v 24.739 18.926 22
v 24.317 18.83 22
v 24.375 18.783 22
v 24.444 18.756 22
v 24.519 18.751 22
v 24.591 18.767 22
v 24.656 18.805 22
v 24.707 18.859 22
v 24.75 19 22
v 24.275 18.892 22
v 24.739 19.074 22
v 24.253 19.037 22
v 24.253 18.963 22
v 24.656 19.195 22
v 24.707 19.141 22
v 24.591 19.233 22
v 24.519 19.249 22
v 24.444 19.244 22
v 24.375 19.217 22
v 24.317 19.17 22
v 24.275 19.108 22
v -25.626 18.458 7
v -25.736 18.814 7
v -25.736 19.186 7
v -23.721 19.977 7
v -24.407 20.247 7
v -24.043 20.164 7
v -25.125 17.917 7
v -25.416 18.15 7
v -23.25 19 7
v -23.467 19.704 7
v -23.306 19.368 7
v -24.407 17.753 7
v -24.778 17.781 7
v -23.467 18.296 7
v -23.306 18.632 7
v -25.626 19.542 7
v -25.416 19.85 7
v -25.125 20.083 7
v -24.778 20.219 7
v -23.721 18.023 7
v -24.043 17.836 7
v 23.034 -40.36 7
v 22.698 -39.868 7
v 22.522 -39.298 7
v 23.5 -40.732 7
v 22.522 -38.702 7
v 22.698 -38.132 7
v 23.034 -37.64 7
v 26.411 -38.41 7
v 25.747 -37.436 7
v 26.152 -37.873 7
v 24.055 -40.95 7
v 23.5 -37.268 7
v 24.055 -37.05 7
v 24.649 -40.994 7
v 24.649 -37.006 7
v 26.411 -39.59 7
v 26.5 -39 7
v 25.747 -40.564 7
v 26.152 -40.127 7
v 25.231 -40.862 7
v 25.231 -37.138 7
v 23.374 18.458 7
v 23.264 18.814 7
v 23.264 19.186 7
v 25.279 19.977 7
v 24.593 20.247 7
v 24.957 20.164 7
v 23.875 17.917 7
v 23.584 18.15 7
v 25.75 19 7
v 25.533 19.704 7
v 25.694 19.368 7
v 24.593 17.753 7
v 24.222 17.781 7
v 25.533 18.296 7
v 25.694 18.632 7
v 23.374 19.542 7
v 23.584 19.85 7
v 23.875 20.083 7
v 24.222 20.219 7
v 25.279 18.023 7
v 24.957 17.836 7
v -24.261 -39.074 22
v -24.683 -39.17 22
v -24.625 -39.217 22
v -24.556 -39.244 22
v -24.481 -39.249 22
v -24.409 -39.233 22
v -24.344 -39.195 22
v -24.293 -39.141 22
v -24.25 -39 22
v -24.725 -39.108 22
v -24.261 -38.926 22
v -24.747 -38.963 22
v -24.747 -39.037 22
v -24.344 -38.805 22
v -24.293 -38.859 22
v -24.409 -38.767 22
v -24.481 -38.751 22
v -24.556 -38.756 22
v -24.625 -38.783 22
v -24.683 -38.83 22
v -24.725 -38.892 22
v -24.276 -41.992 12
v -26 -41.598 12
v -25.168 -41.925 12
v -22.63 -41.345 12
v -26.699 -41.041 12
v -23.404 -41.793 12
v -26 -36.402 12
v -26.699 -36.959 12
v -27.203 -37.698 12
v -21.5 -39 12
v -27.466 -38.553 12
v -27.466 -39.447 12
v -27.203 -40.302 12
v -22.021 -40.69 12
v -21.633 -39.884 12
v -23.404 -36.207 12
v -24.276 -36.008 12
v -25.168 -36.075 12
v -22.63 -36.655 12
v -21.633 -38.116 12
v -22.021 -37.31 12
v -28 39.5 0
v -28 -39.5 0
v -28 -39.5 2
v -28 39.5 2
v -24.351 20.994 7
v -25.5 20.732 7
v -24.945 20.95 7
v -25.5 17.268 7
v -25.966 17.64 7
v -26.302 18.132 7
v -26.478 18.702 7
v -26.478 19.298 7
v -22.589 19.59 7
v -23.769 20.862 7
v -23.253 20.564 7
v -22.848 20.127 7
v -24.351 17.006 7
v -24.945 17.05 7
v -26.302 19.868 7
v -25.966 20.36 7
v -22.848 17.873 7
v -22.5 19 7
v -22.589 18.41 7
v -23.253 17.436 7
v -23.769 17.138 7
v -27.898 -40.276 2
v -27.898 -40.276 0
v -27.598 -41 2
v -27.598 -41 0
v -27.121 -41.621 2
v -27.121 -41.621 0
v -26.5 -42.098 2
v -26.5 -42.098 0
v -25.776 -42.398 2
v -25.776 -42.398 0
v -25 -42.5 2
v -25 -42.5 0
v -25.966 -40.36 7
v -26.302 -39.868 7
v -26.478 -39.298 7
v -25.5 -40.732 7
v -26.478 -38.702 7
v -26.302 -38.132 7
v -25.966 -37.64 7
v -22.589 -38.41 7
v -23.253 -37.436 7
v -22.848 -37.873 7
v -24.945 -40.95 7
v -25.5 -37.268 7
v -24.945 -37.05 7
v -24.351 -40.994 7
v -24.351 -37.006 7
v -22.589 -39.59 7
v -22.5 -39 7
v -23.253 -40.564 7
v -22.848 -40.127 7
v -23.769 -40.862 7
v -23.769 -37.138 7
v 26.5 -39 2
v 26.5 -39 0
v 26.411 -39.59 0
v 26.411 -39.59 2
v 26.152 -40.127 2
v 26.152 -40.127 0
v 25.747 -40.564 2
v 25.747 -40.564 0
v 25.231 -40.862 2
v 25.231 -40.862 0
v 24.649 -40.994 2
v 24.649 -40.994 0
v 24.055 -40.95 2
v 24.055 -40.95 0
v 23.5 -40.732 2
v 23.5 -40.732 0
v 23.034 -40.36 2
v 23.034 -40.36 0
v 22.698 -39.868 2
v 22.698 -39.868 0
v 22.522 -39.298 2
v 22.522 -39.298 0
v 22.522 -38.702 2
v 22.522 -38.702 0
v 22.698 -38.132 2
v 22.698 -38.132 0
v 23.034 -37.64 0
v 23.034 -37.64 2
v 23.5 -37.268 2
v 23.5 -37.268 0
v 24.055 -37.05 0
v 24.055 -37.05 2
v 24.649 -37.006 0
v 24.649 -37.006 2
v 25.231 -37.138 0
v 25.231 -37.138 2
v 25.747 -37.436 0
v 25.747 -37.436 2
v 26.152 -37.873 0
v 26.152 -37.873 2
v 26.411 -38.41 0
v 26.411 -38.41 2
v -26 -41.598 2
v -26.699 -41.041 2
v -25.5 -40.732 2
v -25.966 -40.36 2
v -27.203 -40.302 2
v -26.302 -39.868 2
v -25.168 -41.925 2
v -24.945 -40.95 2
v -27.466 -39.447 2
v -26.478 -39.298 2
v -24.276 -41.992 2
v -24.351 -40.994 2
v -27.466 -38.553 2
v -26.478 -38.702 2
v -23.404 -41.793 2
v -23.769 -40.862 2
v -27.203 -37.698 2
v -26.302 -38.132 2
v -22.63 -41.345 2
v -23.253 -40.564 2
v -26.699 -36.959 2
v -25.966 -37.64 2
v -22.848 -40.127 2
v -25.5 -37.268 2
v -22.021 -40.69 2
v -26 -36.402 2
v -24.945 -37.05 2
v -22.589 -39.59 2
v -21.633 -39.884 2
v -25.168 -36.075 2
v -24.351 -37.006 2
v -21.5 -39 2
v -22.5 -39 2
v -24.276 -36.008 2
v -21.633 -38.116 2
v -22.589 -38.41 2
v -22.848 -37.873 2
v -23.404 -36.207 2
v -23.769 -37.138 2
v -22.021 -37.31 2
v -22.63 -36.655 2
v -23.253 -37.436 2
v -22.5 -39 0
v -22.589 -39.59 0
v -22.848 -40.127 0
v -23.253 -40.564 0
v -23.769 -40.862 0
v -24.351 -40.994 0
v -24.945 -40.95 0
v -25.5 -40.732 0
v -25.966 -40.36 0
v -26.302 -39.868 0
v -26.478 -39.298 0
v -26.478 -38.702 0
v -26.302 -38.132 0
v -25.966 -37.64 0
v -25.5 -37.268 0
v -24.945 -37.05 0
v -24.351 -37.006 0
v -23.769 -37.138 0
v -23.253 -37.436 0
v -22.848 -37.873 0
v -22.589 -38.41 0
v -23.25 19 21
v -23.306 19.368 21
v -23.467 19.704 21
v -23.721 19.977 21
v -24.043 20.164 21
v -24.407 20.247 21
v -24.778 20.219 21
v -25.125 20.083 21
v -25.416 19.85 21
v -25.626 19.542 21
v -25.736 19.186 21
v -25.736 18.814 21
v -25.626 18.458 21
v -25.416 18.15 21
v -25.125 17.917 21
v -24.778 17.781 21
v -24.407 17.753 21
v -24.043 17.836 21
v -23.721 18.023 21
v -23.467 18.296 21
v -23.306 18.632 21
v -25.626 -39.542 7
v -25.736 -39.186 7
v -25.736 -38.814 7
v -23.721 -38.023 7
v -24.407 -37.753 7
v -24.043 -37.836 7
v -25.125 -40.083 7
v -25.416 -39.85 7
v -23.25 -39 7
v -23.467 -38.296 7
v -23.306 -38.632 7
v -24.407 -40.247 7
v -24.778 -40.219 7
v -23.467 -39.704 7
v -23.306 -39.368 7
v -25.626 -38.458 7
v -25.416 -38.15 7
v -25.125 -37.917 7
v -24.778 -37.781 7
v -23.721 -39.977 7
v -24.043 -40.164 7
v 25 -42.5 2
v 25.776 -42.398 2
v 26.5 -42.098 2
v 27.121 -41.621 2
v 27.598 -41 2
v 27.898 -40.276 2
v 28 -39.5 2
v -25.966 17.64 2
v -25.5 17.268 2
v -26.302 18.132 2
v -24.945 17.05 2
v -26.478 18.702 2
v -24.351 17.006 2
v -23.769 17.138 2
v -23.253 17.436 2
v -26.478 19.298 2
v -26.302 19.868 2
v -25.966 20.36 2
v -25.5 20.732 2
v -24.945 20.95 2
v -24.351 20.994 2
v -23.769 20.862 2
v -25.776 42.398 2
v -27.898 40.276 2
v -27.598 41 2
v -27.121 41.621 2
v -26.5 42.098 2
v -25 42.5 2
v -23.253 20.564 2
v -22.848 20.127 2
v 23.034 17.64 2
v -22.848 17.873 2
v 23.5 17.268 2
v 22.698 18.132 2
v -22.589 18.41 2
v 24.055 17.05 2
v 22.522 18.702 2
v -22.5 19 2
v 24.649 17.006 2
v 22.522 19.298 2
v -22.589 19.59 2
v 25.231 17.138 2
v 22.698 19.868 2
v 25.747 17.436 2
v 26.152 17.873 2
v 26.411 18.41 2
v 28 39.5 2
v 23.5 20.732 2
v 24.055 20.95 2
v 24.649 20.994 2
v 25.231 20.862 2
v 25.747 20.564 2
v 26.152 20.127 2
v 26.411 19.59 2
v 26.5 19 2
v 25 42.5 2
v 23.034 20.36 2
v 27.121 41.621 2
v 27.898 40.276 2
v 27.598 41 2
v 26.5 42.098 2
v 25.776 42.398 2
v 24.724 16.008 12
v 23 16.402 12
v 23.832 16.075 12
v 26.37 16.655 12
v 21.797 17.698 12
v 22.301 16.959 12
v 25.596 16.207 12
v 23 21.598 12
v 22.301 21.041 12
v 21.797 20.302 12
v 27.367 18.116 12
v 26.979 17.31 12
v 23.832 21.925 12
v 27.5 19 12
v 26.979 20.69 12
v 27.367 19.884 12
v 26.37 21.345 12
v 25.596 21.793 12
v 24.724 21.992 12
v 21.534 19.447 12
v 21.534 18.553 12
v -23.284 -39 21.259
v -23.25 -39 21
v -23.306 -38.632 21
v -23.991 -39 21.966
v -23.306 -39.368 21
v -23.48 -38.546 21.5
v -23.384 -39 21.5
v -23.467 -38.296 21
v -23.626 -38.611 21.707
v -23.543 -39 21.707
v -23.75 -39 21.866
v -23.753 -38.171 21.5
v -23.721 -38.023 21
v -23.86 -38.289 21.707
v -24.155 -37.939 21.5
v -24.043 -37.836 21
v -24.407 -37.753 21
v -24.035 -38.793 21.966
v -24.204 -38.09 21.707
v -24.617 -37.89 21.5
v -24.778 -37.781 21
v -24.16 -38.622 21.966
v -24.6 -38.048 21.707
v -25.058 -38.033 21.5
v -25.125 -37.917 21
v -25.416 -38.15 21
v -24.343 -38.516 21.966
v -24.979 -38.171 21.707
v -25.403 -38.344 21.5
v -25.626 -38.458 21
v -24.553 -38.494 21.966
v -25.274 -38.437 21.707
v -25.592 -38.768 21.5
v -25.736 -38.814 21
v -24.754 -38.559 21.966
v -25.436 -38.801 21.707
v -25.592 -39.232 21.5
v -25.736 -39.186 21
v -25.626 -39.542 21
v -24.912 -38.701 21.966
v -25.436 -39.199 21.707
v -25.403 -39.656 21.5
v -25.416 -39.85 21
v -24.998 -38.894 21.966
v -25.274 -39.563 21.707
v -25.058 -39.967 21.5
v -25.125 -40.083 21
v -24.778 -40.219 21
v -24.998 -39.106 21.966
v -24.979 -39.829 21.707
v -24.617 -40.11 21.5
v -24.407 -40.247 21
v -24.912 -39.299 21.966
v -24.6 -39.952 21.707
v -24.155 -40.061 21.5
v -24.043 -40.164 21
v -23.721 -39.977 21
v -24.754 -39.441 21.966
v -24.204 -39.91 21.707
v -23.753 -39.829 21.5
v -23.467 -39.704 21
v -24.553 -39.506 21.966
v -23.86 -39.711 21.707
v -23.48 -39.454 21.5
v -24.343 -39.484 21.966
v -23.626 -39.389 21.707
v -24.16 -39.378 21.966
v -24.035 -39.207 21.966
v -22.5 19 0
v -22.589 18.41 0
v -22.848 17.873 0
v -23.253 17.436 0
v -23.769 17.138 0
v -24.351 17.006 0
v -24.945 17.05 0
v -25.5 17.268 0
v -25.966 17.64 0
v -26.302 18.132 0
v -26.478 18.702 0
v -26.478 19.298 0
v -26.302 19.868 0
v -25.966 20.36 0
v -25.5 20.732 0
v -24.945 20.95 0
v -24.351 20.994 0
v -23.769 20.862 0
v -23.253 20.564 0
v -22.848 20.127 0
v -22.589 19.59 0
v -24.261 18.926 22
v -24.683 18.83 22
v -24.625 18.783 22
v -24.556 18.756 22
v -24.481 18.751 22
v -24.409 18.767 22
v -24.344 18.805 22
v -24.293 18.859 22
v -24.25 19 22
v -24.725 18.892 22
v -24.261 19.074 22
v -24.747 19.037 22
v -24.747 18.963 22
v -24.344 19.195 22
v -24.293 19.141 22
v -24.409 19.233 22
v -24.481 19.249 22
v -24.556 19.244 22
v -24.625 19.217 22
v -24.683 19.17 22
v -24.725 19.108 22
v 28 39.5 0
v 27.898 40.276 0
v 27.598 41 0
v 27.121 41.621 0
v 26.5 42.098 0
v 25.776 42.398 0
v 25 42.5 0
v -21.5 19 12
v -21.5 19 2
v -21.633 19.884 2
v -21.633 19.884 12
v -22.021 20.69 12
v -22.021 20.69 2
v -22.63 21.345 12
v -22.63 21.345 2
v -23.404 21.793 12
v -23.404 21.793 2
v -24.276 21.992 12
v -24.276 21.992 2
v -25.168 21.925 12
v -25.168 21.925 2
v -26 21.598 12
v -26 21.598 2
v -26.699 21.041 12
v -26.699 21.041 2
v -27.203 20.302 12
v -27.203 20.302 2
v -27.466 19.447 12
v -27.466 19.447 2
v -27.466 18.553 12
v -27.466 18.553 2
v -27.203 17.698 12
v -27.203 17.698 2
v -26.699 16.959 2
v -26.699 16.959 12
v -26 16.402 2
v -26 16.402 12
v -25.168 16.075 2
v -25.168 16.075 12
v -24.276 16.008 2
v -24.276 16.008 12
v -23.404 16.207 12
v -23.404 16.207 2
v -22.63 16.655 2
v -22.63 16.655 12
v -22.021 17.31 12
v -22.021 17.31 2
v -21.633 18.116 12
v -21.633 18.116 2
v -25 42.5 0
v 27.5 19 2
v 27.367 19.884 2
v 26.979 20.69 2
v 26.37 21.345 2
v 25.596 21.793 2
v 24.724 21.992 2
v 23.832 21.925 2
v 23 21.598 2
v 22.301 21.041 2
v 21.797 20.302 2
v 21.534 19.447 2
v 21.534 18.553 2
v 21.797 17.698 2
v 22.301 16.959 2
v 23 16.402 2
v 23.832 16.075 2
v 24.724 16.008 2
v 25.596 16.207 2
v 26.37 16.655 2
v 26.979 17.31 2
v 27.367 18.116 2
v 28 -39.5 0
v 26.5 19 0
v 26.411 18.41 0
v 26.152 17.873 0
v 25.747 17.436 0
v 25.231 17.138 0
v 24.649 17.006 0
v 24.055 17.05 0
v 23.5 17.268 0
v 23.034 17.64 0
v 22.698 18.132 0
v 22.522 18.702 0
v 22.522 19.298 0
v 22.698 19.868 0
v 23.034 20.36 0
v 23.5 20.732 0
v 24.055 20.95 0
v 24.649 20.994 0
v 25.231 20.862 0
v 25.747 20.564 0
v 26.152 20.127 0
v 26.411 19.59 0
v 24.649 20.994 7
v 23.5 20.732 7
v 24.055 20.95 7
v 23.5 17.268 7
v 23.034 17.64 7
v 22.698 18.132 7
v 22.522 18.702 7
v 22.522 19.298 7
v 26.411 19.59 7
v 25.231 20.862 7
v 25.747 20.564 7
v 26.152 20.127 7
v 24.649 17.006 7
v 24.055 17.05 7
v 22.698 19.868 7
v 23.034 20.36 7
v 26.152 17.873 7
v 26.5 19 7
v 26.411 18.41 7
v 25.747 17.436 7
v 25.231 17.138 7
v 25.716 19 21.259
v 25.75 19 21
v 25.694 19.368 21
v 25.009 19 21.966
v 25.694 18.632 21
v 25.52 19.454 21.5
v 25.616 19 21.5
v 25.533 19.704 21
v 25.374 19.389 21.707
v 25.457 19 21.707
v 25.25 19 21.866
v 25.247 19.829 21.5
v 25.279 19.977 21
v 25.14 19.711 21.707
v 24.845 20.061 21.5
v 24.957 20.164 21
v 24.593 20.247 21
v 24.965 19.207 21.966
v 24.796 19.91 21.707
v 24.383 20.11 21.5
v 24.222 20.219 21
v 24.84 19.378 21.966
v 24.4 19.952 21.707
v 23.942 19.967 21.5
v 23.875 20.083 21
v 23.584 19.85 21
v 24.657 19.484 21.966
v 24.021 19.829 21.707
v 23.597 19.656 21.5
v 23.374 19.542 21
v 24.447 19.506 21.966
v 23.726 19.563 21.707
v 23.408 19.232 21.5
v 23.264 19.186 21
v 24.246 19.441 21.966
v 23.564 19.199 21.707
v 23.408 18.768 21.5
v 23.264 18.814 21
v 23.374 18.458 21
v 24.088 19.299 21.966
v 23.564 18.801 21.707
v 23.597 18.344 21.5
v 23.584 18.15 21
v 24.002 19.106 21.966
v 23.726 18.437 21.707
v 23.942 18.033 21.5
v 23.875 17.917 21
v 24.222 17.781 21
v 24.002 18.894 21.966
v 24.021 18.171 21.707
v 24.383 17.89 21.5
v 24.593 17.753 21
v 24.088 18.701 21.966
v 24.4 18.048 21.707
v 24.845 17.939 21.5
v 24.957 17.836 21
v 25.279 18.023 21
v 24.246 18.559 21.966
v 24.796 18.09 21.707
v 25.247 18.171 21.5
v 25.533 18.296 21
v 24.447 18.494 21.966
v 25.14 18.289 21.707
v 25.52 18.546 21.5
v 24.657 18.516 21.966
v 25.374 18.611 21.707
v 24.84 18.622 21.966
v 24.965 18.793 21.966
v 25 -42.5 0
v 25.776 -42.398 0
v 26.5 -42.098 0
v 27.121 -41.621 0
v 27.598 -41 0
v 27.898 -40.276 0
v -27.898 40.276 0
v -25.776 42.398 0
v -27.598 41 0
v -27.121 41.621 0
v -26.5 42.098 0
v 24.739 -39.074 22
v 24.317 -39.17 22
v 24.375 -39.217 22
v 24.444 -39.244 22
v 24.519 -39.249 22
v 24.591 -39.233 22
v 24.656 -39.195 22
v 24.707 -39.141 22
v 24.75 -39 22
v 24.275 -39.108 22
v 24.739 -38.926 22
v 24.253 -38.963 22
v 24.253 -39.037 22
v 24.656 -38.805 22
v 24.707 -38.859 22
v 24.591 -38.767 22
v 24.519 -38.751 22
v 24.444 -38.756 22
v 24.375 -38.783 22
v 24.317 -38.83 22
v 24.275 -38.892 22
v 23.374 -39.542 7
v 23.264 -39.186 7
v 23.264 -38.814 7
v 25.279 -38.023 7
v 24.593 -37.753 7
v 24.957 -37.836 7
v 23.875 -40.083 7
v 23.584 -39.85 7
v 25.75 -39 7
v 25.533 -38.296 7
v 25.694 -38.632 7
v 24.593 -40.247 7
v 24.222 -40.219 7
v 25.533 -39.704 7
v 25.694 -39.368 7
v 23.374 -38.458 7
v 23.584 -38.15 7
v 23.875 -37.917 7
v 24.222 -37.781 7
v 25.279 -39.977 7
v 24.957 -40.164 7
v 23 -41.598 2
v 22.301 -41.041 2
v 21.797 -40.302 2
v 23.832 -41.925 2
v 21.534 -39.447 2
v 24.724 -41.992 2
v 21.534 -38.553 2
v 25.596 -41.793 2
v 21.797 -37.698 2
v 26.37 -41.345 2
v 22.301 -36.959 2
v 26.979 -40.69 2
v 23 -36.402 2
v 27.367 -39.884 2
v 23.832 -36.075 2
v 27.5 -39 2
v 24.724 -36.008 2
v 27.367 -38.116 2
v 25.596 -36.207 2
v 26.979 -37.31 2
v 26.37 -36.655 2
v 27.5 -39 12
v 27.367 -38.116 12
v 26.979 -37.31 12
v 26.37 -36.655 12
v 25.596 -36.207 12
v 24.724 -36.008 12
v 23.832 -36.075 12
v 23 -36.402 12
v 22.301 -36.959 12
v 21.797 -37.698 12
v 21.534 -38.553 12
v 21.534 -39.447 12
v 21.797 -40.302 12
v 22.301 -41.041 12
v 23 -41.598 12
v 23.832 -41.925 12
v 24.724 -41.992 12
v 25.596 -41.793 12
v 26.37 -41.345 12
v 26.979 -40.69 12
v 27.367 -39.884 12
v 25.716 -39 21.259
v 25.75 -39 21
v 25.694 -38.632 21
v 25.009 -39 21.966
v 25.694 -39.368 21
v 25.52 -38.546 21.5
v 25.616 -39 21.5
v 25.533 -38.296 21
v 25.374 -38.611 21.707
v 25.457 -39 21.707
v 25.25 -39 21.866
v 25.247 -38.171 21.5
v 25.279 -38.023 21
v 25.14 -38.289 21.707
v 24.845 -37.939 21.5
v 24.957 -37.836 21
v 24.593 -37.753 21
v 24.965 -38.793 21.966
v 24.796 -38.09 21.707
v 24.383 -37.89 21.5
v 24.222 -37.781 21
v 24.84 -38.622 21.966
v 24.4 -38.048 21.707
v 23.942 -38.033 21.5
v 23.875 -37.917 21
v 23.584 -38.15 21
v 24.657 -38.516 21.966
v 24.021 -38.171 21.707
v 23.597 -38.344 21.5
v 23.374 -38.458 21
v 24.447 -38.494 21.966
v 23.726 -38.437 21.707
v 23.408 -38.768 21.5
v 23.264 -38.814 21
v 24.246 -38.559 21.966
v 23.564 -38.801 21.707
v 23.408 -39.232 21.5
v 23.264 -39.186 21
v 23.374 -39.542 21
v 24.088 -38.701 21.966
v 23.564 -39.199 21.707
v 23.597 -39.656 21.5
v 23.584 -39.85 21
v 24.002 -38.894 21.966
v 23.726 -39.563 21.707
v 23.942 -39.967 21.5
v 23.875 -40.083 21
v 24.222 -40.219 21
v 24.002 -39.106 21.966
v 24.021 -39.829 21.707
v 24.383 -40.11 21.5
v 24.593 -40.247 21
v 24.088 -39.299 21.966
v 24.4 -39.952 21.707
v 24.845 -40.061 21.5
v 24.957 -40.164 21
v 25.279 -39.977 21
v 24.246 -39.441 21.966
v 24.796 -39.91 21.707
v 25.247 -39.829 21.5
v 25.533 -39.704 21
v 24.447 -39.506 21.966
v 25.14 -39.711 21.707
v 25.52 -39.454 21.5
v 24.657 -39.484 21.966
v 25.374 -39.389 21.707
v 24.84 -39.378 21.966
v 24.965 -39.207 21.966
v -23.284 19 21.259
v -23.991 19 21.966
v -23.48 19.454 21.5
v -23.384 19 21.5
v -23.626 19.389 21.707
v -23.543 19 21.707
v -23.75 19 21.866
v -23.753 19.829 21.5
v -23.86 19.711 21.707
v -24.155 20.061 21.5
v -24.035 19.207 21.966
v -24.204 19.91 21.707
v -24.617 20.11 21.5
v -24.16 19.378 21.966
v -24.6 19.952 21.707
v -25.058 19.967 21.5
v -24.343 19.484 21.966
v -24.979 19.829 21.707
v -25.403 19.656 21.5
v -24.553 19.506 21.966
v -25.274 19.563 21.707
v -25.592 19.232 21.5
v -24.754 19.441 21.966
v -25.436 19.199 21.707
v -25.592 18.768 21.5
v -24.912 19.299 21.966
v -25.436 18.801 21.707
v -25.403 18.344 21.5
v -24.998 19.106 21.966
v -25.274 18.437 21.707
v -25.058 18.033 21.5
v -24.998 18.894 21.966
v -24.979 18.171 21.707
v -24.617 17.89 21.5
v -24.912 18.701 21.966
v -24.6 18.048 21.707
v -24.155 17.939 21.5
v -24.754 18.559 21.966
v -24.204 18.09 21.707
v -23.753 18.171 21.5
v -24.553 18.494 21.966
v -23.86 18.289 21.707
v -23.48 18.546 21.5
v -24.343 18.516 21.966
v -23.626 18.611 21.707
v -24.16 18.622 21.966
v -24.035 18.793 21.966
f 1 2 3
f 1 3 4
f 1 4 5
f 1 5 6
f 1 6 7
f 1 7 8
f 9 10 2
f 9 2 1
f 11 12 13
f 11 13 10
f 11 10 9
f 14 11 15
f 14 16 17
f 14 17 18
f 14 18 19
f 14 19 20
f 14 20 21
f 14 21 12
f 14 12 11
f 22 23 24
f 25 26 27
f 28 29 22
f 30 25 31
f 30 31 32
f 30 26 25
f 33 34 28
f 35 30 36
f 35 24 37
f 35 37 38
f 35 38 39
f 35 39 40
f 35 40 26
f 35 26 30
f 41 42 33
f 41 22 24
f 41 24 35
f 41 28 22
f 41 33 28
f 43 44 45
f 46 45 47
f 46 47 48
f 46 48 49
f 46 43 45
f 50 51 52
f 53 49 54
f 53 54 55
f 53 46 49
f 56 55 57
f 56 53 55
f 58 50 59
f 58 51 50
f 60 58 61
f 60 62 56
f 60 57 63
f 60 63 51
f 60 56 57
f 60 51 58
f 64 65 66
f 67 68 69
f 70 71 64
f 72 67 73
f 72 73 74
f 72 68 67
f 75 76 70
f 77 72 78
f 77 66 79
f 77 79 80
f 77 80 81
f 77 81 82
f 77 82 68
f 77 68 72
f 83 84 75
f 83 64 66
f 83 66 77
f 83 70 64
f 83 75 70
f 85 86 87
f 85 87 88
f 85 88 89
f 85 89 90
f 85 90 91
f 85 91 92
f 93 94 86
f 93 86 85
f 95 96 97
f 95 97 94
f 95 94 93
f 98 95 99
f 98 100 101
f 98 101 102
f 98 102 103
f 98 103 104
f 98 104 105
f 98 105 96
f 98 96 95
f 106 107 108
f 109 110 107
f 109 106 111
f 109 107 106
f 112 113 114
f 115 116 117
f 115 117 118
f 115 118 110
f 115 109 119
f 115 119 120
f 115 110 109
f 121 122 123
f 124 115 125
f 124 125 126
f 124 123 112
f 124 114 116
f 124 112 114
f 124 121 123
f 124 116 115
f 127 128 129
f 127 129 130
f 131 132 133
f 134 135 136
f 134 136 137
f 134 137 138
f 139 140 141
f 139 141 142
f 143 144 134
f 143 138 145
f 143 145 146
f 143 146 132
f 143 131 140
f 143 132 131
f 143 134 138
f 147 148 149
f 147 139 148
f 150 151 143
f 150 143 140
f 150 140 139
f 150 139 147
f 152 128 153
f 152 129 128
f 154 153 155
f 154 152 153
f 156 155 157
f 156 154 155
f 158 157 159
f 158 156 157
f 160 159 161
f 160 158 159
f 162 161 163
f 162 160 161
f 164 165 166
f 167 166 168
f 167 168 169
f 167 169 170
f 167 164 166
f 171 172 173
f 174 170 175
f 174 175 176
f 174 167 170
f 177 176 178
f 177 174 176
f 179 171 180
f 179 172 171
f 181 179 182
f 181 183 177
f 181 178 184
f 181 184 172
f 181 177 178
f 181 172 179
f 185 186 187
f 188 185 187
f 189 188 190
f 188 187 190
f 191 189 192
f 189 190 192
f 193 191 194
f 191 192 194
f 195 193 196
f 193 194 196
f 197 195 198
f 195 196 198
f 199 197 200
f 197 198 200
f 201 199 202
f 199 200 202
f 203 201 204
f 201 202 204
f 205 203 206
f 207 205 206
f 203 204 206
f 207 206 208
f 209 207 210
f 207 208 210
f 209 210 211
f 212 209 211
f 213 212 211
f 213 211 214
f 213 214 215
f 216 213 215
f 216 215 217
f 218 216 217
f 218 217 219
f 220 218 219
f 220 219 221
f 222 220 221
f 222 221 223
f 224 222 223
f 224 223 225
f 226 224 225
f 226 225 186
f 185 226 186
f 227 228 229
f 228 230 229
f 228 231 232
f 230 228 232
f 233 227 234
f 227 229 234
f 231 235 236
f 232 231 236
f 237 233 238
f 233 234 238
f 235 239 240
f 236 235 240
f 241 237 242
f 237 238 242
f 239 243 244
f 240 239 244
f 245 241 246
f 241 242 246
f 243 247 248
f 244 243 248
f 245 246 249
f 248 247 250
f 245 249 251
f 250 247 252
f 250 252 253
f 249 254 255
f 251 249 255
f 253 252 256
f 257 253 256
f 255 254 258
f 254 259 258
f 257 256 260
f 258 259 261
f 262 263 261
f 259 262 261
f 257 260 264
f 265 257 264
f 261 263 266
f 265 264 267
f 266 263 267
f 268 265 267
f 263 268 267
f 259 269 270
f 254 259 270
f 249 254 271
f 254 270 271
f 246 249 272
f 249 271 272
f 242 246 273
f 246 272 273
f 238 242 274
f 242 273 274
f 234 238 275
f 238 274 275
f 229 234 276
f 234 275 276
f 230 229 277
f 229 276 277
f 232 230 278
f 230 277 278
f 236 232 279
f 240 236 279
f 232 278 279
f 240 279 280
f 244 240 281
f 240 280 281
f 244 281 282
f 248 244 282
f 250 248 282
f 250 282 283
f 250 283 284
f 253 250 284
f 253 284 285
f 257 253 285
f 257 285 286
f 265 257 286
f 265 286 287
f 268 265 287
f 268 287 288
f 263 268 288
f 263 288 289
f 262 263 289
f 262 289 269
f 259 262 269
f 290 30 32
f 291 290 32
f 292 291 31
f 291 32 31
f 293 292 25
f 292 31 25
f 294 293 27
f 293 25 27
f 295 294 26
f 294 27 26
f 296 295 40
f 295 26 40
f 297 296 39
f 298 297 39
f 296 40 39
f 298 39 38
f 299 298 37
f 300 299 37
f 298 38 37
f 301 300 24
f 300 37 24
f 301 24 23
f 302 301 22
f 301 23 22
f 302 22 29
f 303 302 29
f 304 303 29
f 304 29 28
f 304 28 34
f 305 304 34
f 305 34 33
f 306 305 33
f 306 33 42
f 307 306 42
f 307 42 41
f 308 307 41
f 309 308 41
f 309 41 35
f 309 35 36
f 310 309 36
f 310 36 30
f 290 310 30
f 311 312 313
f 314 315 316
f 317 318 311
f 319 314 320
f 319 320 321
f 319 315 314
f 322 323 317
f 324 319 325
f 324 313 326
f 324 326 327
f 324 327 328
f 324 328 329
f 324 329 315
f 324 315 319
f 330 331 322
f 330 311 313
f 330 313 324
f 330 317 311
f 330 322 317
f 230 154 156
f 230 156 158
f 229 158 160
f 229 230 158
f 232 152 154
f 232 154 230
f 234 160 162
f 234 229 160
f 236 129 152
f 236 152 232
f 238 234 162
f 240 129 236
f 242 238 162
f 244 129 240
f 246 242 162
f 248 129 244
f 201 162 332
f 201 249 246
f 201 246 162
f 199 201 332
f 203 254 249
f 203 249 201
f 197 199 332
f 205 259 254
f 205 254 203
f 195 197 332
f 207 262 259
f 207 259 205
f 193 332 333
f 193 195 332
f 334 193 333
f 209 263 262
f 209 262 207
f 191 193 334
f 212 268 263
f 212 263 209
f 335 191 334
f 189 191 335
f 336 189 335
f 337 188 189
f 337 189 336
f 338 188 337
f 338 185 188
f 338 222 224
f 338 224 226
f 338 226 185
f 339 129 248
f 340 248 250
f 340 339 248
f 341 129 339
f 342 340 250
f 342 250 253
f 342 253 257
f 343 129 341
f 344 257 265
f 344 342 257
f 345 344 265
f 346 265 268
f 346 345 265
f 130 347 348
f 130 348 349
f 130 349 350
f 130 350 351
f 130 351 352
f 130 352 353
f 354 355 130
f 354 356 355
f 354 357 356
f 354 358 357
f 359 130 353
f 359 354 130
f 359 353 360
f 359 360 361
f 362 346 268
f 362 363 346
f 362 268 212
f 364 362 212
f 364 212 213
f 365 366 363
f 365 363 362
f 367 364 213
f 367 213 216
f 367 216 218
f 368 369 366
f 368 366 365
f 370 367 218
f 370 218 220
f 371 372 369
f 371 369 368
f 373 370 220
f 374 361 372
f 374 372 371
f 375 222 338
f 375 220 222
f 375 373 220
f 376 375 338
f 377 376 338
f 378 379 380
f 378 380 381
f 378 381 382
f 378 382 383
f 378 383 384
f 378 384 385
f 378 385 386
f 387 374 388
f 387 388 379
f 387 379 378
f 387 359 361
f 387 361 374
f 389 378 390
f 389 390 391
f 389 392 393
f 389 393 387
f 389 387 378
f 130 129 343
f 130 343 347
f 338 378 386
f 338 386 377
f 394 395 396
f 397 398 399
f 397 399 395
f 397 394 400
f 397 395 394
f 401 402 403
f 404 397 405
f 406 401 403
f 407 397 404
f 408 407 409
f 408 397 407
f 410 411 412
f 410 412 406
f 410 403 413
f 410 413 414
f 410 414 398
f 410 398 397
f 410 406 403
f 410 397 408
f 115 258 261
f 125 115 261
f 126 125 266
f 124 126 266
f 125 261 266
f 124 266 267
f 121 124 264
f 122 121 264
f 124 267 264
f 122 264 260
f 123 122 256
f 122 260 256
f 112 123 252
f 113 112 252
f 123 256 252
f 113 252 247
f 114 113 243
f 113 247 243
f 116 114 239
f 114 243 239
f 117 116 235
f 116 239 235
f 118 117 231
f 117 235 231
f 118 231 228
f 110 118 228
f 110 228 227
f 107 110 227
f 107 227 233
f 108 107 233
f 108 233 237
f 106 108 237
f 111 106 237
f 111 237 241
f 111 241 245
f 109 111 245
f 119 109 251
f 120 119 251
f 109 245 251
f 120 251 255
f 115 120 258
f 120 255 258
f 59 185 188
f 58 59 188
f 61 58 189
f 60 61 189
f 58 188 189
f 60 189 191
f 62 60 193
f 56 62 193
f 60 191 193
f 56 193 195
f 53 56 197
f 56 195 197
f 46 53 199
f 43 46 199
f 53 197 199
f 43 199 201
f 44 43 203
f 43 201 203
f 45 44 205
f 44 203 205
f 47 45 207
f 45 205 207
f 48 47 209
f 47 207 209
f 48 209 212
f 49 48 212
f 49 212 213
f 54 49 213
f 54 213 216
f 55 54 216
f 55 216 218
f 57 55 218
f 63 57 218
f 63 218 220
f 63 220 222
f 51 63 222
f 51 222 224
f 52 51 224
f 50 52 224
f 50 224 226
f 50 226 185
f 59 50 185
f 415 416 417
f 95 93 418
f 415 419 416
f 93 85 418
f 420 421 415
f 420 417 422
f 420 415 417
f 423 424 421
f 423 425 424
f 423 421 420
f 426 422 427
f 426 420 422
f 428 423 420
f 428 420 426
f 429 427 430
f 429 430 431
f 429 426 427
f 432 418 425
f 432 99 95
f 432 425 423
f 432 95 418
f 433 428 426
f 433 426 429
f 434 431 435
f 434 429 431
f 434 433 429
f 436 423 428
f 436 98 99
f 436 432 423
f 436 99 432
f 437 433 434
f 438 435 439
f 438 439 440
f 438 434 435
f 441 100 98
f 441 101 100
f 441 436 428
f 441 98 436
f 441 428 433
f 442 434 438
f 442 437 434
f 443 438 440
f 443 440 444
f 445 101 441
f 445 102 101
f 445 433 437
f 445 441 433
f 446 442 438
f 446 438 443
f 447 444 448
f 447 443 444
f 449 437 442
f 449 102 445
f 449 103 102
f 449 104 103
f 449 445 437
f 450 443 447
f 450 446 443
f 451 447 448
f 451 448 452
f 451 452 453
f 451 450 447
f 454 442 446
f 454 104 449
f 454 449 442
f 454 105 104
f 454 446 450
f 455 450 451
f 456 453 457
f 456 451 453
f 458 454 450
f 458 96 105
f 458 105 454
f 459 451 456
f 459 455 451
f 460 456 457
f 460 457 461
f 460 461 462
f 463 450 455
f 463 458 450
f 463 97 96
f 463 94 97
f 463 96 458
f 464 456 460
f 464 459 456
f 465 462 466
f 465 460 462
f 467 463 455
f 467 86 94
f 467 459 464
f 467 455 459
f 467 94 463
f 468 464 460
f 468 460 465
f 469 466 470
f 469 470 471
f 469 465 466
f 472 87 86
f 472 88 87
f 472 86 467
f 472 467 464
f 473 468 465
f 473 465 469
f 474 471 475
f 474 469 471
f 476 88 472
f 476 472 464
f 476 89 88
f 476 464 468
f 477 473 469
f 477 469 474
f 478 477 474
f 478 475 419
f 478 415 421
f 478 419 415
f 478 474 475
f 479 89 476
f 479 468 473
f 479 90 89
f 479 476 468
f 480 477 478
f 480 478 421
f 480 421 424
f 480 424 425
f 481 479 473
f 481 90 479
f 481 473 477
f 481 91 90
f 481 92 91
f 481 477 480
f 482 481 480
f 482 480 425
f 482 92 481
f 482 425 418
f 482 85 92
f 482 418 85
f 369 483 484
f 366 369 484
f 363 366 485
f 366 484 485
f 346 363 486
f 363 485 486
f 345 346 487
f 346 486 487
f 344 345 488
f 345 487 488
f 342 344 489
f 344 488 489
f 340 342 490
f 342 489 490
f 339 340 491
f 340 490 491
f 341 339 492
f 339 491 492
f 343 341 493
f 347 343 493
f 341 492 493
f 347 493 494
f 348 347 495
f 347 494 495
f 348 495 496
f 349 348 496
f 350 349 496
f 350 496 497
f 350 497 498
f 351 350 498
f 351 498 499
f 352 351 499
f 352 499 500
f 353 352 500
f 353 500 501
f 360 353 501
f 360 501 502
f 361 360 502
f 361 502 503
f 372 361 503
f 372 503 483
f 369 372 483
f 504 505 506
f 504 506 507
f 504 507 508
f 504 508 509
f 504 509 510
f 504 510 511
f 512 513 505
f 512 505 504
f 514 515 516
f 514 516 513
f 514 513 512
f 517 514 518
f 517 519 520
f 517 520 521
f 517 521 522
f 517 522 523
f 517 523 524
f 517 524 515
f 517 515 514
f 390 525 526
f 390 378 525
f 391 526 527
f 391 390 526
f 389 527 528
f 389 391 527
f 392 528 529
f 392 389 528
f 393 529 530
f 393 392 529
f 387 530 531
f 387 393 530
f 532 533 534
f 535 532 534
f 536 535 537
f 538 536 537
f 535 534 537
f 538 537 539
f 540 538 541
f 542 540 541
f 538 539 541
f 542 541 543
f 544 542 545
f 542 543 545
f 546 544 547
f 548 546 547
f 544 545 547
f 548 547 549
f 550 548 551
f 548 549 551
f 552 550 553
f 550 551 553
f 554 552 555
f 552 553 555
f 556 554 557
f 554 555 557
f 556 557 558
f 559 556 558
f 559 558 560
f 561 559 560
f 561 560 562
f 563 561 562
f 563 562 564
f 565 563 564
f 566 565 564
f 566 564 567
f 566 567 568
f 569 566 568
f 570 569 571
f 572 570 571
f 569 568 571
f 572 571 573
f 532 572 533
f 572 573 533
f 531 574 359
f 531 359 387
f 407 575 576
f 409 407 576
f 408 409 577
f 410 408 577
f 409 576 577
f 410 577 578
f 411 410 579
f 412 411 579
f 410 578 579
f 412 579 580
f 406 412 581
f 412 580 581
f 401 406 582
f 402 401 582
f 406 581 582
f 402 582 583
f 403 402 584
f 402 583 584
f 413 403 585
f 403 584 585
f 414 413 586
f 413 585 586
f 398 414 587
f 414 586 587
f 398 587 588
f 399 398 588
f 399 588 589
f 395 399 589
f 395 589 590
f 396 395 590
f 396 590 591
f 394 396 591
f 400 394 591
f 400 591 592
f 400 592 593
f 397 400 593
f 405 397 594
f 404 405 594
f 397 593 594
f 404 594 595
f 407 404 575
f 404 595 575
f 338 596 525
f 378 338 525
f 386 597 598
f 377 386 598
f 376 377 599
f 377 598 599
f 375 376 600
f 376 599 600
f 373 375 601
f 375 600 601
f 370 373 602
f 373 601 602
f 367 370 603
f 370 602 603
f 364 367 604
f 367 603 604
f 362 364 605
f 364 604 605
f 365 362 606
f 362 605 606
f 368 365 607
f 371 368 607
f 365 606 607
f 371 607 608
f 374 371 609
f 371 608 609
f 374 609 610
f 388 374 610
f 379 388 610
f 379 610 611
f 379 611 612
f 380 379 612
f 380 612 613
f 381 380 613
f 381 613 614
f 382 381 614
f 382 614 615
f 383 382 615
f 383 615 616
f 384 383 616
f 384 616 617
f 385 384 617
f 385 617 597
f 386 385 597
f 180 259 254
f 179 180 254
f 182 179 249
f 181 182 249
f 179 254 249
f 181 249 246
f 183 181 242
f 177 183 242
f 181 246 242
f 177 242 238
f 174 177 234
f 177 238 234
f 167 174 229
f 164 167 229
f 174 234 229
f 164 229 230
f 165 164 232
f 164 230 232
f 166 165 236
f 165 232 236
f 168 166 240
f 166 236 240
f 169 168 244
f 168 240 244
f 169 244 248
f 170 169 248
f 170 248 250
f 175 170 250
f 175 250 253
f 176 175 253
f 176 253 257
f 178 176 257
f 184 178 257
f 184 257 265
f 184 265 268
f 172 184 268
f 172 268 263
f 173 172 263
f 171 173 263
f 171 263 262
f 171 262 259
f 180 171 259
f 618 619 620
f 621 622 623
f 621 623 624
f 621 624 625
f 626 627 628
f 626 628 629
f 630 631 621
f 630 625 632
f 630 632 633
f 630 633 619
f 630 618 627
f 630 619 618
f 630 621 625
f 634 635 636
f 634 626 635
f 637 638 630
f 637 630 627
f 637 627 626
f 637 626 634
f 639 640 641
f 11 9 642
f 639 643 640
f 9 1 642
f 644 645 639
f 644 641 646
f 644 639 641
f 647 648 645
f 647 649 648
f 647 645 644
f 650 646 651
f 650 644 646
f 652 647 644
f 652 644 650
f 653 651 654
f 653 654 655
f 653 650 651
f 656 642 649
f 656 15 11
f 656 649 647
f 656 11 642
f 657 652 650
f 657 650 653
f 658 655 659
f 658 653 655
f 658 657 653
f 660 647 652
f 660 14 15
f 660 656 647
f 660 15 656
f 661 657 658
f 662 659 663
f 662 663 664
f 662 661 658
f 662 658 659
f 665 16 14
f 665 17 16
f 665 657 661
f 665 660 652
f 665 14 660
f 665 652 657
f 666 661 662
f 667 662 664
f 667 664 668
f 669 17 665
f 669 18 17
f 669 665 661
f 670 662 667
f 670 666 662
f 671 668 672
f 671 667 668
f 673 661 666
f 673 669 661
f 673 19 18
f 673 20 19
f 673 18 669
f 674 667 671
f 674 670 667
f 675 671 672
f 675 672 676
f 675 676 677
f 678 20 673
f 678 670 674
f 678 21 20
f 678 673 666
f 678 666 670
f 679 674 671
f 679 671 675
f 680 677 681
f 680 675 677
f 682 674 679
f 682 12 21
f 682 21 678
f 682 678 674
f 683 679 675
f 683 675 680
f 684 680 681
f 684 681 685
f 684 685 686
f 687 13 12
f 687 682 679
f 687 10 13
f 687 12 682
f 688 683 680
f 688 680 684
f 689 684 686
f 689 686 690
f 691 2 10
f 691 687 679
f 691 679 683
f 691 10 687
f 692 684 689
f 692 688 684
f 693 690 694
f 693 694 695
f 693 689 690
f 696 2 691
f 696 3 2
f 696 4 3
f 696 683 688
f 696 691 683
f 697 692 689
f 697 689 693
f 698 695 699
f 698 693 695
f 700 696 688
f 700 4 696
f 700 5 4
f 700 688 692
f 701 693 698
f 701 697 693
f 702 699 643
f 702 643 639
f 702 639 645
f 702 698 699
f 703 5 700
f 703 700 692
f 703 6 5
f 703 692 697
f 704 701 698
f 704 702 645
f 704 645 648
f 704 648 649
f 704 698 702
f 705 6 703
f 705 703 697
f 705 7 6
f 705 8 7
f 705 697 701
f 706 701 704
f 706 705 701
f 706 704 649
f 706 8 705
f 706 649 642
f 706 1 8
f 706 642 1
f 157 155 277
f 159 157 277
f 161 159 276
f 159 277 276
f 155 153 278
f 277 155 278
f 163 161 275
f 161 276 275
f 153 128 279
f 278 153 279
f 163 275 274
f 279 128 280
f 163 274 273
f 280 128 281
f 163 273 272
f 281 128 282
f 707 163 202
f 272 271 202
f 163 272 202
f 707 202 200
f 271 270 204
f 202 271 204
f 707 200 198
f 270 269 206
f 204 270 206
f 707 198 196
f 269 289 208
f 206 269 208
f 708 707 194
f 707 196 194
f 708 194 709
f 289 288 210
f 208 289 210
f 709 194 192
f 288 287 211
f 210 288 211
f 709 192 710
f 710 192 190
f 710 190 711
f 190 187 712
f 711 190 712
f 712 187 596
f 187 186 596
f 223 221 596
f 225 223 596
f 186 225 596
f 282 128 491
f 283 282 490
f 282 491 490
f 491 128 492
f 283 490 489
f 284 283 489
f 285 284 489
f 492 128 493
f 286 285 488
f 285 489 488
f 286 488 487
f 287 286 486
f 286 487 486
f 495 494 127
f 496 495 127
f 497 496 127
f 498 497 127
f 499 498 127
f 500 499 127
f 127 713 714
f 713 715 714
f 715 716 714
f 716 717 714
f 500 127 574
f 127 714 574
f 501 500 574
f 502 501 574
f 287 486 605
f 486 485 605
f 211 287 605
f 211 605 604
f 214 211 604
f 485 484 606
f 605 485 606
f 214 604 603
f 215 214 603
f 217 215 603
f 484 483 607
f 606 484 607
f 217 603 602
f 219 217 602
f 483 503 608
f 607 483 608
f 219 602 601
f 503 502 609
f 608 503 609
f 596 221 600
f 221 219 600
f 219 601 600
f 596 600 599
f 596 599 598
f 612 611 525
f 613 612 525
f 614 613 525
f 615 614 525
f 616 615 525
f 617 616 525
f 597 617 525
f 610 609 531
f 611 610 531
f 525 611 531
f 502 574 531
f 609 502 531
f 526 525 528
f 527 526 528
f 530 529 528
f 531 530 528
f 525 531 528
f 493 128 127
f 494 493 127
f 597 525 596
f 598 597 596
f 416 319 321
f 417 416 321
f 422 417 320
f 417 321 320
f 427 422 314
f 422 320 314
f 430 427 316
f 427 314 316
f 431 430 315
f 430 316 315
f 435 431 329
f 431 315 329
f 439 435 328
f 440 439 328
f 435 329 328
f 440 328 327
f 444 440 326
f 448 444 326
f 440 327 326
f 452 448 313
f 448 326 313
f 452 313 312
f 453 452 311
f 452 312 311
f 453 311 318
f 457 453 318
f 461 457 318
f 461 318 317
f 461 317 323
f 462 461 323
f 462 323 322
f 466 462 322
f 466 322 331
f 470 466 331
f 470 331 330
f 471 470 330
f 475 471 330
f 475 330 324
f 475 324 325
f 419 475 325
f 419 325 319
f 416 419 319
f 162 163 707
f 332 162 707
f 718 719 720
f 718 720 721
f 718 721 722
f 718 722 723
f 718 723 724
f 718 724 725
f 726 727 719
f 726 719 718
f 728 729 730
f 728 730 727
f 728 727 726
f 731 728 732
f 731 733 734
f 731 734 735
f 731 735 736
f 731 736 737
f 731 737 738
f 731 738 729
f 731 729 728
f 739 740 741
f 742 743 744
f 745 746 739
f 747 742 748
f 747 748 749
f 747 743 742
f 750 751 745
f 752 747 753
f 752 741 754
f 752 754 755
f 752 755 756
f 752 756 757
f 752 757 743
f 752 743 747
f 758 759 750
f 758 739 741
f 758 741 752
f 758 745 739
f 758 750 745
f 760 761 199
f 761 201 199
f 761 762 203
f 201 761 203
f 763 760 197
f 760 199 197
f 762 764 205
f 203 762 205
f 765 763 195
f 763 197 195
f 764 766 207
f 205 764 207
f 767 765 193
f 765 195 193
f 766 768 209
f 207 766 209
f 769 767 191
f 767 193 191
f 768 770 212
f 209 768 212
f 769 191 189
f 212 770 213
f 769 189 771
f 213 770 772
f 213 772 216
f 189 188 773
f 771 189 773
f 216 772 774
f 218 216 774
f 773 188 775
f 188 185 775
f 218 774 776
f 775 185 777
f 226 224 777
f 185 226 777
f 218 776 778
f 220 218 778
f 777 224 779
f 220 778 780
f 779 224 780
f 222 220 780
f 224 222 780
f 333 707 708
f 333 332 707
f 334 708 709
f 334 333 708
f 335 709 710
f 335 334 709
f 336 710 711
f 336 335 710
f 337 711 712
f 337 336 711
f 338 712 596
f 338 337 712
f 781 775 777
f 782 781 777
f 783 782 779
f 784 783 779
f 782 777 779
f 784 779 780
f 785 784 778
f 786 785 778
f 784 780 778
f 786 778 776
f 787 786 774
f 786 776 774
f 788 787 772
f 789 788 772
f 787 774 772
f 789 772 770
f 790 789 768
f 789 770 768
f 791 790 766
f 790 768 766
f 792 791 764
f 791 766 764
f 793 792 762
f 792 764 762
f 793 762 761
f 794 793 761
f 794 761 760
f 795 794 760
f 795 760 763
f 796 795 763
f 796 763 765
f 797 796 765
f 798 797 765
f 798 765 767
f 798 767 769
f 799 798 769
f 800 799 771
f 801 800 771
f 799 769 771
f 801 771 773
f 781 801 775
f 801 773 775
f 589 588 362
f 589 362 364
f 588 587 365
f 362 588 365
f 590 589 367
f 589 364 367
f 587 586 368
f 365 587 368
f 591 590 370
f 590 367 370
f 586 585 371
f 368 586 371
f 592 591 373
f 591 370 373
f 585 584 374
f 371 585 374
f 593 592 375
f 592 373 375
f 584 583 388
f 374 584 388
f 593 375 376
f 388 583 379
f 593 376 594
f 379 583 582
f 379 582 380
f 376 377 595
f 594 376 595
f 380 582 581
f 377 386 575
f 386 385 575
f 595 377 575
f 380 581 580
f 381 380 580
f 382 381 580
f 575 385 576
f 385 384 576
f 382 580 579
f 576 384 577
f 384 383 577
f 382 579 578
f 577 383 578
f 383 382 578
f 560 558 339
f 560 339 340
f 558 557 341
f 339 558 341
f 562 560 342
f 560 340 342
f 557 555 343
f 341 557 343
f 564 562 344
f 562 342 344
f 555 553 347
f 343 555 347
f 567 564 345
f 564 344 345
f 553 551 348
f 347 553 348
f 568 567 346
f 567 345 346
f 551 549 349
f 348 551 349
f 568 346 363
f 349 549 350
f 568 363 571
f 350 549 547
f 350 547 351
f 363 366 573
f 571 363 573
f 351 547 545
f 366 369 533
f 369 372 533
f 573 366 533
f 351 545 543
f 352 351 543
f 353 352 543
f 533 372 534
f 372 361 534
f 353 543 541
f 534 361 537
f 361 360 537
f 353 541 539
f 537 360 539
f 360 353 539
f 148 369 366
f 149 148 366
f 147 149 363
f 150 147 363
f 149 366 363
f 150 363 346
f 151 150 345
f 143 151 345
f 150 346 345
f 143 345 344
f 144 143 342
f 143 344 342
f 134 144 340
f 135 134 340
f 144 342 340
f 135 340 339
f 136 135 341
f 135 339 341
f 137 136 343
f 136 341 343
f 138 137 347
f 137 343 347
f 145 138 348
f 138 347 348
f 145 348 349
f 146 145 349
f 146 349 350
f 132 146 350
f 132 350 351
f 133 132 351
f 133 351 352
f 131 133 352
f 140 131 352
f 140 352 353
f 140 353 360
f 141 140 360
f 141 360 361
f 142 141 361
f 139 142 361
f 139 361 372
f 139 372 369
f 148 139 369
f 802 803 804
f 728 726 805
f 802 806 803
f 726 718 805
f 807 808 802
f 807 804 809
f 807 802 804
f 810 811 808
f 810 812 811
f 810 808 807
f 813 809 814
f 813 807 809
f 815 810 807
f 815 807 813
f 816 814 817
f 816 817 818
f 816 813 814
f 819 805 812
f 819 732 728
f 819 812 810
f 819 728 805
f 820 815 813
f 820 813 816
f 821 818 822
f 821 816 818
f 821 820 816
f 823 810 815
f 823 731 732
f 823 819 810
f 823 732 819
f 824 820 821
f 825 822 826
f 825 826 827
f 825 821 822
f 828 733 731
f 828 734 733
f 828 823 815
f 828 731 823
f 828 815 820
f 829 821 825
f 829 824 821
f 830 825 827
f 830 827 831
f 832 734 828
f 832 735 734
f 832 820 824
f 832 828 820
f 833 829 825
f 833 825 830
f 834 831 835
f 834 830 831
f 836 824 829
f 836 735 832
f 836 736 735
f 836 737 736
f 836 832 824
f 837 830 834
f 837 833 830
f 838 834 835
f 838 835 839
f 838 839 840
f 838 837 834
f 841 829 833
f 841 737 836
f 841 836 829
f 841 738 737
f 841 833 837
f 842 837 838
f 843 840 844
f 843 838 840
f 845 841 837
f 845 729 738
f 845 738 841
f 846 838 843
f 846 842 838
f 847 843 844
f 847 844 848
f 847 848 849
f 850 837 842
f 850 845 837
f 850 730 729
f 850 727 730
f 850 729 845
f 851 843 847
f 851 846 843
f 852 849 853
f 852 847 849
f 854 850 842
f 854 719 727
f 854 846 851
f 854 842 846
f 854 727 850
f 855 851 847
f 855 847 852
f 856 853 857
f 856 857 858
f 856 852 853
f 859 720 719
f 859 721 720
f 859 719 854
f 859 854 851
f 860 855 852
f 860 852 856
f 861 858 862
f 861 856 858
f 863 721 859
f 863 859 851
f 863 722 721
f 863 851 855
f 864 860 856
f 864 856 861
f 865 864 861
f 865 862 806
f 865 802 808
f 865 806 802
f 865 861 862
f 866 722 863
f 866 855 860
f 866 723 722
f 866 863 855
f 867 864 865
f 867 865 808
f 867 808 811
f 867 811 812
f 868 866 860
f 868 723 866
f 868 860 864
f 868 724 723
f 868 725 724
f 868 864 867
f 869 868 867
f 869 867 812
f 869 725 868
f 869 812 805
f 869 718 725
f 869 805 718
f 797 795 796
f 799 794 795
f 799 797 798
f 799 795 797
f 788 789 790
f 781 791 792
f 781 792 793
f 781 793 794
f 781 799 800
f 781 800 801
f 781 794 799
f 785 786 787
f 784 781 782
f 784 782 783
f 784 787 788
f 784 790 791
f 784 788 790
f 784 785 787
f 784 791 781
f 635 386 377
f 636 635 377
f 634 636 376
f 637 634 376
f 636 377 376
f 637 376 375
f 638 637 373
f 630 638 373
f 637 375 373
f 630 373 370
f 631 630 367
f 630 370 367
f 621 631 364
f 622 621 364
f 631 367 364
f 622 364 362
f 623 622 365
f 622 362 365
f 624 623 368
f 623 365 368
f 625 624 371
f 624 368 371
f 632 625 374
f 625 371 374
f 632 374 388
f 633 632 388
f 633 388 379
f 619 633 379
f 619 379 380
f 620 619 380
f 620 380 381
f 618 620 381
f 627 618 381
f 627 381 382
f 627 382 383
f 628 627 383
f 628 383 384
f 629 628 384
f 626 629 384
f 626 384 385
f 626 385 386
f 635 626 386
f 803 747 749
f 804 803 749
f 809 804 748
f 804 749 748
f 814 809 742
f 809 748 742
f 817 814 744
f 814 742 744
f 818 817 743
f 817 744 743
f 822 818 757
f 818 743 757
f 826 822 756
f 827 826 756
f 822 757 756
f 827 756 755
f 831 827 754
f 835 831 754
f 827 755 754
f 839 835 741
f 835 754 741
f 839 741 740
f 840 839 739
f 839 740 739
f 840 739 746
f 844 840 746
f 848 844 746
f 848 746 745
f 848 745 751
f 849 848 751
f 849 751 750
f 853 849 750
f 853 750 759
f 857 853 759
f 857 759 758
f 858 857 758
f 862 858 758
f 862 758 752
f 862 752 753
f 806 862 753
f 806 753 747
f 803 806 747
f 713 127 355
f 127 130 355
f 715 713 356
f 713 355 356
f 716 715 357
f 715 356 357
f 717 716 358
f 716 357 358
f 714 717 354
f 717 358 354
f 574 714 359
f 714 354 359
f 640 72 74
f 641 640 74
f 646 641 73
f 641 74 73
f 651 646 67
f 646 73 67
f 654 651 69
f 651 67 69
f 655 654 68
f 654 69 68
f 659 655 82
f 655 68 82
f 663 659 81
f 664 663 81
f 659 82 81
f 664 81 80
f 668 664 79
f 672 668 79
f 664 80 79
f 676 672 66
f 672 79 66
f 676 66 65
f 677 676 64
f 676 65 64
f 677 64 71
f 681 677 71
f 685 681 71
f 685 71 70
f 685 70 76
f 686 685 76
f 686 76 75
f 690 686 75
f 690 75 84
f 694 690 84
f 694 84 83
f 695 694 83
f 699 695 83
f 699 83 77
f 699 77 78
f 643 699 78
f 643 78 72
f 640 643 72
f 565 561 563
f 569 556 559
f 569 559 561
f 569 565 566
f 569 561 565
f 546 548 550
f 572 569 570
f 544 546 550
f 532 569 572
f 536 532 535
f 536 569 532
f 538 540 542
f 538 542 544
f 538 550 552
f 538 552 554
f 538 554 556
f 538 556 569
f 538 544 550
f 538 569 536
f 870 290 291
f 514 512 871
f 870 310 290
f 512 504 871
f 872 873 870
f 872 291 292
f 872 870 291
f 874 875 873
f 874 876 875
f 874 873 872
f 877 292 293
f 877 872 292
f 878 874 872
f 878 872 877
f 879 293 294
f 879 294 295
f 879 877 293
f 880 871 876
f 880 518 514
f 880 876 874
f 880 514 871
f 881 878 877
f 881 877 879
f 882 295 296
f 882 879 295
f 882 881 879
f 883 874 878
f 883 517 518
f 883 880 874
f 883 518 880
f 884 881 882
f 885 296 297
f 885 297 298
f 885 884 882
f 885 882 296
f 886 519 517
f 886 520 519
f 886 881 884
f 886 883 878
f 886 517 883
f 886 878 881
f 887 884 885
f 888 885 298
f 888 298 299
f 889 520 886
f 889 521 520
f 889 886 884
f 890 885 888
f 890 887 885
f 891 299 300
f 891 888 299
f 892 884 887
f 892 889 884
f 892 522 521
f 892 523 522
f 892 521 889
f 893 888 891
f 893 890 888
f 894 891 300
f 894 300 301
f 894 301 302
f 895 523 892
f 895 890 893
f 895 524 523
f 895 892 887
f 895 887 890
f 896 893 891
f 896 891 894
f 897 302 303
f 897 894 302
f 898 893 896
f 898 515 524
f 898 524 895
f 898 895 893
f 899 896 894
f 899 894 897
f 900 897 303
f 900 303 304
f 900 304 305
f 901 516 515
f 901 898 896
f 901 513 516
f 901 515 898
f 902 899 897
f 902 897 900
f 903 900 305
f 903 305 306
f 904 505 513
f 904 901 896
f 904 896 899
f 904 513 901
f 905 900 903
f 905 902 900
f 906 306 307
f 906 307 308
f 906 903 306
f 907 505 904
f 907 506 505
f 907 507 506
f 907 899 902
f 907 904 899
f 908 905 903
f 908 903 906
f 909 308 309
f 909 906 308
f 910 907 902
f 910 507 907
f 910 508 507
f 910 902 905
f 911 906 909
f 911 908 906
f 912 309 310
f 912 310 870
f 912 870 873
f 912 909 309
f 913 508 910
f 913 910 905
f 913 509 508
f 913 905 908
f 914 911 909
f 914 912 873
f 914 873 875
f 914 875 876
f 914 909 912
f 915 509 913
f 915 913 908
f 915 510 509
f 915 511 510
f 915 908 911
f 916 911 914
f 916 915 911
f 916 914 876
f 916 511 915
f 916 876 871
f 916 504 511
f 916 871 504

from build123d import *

# Parameters (mm, degrees)
F0_W     = 56
F0_H     = 85
F1_DEPTH = 2
F2_R     = 3
F3_R     = 1.25
F5_DEPTH = 20
F4_R     = 3
F6_DEPTH = 10
F7_R     = 2
F8_DEPTH = 7
F9_R     = 1


with BuildPart() as f1:
    # F0 (on Top) → F1 (new body)
    with BuildSketch(Plane.XY):
        Rectangle(F0_W, F0_H)
    extrude(amount=F1_DEPTH)

    # F2
    f2_edges = [f1.edges().sort_by_distance(p)[0] for p in [
        (-28, 42.5, 1),
        (28, 42.5, 1),
        (28, -42.5, 1),
        (-28, -42.5, 1),
    ]]
    fillet(f2_edges, radius=F2_R)


with BuildPart() as f5:
    # F3 (on face) → F5 (new body)
    with BuildSketch(Plane.XY.offset(2)):
        with Locations((-24.5, -39)):
            Circle(F3_R)
        with Locations((24.5, -39)):
            Circle(F3_R)
        with Locations((-24.5, 19)):
            Circle(F3_R)
        with Locations((24.5, 19)):
            Circle(F3_R)
    extrude(amount=F5_DEPTH)


with BuildPart() as f6:
    # F4 (on face) → F6 (new body)
    with BuildSketch(Plane.XY.offset(2)):
        with Locations((-24.5, 19)):
            Circle(F4_R)
        with Locations((24.5, 19)):
            Circle(F4_R)
        with Locations((-24.5, -39)):
            Circle(F4_R)
        with Locations((24.5, -39)):
            Circle(F4_R)
    extrude(amount=F6_DEPTH)


with BuildPart() as f8_tool:
    # F7 (on face) → F8 (new body)
    with BuildSketch(Plane(origin=(0, 0, 0), x_dir=(1, 0, 0), z_dir=(0, 0, -1))):
        with Locations((-24.5, 39)):
            Circle(F7_R)
        with Locations((24.5, 39)):
            Circle(F7_R)
        with Locations((-24.5, -19)):
            Circle(F7_R)
        with Locations((24.5, -19)):
            Circle(F7_R)
    extrude(amount=-F8_DEPTH)


with BuildPart() as f1_1:
    add(f1.part)

    # F8: cut by f8_tool
    add(f8_tool.part, mode=Mode.SUBTRACT)


with BuildPart() as f5_1:
    add(f5.part)

    # F8: cut by f8_tool
    add(f8_tool.part, mode=Mode.SUBTRACT)

    # F9
    f9_edges = [f5_1.edges().sort_by_distance(p)[0] for p in [
        (-25.75, 19, 22),
        (-25.75, -39, 22),
        (23.25, -39, 22),
        (23.25, 19, 22),
    ]]
    fillet(f9_edges, radius=F9_R)


with BuildPart() as f6_1:
    add(f6.part)

    # F8: cut by f8_tool
    add(f8_tool.part, mode=Mode.SUBTRACT)


solid = Compound([f1_1.part, f5_1.part, f6_1.part])
